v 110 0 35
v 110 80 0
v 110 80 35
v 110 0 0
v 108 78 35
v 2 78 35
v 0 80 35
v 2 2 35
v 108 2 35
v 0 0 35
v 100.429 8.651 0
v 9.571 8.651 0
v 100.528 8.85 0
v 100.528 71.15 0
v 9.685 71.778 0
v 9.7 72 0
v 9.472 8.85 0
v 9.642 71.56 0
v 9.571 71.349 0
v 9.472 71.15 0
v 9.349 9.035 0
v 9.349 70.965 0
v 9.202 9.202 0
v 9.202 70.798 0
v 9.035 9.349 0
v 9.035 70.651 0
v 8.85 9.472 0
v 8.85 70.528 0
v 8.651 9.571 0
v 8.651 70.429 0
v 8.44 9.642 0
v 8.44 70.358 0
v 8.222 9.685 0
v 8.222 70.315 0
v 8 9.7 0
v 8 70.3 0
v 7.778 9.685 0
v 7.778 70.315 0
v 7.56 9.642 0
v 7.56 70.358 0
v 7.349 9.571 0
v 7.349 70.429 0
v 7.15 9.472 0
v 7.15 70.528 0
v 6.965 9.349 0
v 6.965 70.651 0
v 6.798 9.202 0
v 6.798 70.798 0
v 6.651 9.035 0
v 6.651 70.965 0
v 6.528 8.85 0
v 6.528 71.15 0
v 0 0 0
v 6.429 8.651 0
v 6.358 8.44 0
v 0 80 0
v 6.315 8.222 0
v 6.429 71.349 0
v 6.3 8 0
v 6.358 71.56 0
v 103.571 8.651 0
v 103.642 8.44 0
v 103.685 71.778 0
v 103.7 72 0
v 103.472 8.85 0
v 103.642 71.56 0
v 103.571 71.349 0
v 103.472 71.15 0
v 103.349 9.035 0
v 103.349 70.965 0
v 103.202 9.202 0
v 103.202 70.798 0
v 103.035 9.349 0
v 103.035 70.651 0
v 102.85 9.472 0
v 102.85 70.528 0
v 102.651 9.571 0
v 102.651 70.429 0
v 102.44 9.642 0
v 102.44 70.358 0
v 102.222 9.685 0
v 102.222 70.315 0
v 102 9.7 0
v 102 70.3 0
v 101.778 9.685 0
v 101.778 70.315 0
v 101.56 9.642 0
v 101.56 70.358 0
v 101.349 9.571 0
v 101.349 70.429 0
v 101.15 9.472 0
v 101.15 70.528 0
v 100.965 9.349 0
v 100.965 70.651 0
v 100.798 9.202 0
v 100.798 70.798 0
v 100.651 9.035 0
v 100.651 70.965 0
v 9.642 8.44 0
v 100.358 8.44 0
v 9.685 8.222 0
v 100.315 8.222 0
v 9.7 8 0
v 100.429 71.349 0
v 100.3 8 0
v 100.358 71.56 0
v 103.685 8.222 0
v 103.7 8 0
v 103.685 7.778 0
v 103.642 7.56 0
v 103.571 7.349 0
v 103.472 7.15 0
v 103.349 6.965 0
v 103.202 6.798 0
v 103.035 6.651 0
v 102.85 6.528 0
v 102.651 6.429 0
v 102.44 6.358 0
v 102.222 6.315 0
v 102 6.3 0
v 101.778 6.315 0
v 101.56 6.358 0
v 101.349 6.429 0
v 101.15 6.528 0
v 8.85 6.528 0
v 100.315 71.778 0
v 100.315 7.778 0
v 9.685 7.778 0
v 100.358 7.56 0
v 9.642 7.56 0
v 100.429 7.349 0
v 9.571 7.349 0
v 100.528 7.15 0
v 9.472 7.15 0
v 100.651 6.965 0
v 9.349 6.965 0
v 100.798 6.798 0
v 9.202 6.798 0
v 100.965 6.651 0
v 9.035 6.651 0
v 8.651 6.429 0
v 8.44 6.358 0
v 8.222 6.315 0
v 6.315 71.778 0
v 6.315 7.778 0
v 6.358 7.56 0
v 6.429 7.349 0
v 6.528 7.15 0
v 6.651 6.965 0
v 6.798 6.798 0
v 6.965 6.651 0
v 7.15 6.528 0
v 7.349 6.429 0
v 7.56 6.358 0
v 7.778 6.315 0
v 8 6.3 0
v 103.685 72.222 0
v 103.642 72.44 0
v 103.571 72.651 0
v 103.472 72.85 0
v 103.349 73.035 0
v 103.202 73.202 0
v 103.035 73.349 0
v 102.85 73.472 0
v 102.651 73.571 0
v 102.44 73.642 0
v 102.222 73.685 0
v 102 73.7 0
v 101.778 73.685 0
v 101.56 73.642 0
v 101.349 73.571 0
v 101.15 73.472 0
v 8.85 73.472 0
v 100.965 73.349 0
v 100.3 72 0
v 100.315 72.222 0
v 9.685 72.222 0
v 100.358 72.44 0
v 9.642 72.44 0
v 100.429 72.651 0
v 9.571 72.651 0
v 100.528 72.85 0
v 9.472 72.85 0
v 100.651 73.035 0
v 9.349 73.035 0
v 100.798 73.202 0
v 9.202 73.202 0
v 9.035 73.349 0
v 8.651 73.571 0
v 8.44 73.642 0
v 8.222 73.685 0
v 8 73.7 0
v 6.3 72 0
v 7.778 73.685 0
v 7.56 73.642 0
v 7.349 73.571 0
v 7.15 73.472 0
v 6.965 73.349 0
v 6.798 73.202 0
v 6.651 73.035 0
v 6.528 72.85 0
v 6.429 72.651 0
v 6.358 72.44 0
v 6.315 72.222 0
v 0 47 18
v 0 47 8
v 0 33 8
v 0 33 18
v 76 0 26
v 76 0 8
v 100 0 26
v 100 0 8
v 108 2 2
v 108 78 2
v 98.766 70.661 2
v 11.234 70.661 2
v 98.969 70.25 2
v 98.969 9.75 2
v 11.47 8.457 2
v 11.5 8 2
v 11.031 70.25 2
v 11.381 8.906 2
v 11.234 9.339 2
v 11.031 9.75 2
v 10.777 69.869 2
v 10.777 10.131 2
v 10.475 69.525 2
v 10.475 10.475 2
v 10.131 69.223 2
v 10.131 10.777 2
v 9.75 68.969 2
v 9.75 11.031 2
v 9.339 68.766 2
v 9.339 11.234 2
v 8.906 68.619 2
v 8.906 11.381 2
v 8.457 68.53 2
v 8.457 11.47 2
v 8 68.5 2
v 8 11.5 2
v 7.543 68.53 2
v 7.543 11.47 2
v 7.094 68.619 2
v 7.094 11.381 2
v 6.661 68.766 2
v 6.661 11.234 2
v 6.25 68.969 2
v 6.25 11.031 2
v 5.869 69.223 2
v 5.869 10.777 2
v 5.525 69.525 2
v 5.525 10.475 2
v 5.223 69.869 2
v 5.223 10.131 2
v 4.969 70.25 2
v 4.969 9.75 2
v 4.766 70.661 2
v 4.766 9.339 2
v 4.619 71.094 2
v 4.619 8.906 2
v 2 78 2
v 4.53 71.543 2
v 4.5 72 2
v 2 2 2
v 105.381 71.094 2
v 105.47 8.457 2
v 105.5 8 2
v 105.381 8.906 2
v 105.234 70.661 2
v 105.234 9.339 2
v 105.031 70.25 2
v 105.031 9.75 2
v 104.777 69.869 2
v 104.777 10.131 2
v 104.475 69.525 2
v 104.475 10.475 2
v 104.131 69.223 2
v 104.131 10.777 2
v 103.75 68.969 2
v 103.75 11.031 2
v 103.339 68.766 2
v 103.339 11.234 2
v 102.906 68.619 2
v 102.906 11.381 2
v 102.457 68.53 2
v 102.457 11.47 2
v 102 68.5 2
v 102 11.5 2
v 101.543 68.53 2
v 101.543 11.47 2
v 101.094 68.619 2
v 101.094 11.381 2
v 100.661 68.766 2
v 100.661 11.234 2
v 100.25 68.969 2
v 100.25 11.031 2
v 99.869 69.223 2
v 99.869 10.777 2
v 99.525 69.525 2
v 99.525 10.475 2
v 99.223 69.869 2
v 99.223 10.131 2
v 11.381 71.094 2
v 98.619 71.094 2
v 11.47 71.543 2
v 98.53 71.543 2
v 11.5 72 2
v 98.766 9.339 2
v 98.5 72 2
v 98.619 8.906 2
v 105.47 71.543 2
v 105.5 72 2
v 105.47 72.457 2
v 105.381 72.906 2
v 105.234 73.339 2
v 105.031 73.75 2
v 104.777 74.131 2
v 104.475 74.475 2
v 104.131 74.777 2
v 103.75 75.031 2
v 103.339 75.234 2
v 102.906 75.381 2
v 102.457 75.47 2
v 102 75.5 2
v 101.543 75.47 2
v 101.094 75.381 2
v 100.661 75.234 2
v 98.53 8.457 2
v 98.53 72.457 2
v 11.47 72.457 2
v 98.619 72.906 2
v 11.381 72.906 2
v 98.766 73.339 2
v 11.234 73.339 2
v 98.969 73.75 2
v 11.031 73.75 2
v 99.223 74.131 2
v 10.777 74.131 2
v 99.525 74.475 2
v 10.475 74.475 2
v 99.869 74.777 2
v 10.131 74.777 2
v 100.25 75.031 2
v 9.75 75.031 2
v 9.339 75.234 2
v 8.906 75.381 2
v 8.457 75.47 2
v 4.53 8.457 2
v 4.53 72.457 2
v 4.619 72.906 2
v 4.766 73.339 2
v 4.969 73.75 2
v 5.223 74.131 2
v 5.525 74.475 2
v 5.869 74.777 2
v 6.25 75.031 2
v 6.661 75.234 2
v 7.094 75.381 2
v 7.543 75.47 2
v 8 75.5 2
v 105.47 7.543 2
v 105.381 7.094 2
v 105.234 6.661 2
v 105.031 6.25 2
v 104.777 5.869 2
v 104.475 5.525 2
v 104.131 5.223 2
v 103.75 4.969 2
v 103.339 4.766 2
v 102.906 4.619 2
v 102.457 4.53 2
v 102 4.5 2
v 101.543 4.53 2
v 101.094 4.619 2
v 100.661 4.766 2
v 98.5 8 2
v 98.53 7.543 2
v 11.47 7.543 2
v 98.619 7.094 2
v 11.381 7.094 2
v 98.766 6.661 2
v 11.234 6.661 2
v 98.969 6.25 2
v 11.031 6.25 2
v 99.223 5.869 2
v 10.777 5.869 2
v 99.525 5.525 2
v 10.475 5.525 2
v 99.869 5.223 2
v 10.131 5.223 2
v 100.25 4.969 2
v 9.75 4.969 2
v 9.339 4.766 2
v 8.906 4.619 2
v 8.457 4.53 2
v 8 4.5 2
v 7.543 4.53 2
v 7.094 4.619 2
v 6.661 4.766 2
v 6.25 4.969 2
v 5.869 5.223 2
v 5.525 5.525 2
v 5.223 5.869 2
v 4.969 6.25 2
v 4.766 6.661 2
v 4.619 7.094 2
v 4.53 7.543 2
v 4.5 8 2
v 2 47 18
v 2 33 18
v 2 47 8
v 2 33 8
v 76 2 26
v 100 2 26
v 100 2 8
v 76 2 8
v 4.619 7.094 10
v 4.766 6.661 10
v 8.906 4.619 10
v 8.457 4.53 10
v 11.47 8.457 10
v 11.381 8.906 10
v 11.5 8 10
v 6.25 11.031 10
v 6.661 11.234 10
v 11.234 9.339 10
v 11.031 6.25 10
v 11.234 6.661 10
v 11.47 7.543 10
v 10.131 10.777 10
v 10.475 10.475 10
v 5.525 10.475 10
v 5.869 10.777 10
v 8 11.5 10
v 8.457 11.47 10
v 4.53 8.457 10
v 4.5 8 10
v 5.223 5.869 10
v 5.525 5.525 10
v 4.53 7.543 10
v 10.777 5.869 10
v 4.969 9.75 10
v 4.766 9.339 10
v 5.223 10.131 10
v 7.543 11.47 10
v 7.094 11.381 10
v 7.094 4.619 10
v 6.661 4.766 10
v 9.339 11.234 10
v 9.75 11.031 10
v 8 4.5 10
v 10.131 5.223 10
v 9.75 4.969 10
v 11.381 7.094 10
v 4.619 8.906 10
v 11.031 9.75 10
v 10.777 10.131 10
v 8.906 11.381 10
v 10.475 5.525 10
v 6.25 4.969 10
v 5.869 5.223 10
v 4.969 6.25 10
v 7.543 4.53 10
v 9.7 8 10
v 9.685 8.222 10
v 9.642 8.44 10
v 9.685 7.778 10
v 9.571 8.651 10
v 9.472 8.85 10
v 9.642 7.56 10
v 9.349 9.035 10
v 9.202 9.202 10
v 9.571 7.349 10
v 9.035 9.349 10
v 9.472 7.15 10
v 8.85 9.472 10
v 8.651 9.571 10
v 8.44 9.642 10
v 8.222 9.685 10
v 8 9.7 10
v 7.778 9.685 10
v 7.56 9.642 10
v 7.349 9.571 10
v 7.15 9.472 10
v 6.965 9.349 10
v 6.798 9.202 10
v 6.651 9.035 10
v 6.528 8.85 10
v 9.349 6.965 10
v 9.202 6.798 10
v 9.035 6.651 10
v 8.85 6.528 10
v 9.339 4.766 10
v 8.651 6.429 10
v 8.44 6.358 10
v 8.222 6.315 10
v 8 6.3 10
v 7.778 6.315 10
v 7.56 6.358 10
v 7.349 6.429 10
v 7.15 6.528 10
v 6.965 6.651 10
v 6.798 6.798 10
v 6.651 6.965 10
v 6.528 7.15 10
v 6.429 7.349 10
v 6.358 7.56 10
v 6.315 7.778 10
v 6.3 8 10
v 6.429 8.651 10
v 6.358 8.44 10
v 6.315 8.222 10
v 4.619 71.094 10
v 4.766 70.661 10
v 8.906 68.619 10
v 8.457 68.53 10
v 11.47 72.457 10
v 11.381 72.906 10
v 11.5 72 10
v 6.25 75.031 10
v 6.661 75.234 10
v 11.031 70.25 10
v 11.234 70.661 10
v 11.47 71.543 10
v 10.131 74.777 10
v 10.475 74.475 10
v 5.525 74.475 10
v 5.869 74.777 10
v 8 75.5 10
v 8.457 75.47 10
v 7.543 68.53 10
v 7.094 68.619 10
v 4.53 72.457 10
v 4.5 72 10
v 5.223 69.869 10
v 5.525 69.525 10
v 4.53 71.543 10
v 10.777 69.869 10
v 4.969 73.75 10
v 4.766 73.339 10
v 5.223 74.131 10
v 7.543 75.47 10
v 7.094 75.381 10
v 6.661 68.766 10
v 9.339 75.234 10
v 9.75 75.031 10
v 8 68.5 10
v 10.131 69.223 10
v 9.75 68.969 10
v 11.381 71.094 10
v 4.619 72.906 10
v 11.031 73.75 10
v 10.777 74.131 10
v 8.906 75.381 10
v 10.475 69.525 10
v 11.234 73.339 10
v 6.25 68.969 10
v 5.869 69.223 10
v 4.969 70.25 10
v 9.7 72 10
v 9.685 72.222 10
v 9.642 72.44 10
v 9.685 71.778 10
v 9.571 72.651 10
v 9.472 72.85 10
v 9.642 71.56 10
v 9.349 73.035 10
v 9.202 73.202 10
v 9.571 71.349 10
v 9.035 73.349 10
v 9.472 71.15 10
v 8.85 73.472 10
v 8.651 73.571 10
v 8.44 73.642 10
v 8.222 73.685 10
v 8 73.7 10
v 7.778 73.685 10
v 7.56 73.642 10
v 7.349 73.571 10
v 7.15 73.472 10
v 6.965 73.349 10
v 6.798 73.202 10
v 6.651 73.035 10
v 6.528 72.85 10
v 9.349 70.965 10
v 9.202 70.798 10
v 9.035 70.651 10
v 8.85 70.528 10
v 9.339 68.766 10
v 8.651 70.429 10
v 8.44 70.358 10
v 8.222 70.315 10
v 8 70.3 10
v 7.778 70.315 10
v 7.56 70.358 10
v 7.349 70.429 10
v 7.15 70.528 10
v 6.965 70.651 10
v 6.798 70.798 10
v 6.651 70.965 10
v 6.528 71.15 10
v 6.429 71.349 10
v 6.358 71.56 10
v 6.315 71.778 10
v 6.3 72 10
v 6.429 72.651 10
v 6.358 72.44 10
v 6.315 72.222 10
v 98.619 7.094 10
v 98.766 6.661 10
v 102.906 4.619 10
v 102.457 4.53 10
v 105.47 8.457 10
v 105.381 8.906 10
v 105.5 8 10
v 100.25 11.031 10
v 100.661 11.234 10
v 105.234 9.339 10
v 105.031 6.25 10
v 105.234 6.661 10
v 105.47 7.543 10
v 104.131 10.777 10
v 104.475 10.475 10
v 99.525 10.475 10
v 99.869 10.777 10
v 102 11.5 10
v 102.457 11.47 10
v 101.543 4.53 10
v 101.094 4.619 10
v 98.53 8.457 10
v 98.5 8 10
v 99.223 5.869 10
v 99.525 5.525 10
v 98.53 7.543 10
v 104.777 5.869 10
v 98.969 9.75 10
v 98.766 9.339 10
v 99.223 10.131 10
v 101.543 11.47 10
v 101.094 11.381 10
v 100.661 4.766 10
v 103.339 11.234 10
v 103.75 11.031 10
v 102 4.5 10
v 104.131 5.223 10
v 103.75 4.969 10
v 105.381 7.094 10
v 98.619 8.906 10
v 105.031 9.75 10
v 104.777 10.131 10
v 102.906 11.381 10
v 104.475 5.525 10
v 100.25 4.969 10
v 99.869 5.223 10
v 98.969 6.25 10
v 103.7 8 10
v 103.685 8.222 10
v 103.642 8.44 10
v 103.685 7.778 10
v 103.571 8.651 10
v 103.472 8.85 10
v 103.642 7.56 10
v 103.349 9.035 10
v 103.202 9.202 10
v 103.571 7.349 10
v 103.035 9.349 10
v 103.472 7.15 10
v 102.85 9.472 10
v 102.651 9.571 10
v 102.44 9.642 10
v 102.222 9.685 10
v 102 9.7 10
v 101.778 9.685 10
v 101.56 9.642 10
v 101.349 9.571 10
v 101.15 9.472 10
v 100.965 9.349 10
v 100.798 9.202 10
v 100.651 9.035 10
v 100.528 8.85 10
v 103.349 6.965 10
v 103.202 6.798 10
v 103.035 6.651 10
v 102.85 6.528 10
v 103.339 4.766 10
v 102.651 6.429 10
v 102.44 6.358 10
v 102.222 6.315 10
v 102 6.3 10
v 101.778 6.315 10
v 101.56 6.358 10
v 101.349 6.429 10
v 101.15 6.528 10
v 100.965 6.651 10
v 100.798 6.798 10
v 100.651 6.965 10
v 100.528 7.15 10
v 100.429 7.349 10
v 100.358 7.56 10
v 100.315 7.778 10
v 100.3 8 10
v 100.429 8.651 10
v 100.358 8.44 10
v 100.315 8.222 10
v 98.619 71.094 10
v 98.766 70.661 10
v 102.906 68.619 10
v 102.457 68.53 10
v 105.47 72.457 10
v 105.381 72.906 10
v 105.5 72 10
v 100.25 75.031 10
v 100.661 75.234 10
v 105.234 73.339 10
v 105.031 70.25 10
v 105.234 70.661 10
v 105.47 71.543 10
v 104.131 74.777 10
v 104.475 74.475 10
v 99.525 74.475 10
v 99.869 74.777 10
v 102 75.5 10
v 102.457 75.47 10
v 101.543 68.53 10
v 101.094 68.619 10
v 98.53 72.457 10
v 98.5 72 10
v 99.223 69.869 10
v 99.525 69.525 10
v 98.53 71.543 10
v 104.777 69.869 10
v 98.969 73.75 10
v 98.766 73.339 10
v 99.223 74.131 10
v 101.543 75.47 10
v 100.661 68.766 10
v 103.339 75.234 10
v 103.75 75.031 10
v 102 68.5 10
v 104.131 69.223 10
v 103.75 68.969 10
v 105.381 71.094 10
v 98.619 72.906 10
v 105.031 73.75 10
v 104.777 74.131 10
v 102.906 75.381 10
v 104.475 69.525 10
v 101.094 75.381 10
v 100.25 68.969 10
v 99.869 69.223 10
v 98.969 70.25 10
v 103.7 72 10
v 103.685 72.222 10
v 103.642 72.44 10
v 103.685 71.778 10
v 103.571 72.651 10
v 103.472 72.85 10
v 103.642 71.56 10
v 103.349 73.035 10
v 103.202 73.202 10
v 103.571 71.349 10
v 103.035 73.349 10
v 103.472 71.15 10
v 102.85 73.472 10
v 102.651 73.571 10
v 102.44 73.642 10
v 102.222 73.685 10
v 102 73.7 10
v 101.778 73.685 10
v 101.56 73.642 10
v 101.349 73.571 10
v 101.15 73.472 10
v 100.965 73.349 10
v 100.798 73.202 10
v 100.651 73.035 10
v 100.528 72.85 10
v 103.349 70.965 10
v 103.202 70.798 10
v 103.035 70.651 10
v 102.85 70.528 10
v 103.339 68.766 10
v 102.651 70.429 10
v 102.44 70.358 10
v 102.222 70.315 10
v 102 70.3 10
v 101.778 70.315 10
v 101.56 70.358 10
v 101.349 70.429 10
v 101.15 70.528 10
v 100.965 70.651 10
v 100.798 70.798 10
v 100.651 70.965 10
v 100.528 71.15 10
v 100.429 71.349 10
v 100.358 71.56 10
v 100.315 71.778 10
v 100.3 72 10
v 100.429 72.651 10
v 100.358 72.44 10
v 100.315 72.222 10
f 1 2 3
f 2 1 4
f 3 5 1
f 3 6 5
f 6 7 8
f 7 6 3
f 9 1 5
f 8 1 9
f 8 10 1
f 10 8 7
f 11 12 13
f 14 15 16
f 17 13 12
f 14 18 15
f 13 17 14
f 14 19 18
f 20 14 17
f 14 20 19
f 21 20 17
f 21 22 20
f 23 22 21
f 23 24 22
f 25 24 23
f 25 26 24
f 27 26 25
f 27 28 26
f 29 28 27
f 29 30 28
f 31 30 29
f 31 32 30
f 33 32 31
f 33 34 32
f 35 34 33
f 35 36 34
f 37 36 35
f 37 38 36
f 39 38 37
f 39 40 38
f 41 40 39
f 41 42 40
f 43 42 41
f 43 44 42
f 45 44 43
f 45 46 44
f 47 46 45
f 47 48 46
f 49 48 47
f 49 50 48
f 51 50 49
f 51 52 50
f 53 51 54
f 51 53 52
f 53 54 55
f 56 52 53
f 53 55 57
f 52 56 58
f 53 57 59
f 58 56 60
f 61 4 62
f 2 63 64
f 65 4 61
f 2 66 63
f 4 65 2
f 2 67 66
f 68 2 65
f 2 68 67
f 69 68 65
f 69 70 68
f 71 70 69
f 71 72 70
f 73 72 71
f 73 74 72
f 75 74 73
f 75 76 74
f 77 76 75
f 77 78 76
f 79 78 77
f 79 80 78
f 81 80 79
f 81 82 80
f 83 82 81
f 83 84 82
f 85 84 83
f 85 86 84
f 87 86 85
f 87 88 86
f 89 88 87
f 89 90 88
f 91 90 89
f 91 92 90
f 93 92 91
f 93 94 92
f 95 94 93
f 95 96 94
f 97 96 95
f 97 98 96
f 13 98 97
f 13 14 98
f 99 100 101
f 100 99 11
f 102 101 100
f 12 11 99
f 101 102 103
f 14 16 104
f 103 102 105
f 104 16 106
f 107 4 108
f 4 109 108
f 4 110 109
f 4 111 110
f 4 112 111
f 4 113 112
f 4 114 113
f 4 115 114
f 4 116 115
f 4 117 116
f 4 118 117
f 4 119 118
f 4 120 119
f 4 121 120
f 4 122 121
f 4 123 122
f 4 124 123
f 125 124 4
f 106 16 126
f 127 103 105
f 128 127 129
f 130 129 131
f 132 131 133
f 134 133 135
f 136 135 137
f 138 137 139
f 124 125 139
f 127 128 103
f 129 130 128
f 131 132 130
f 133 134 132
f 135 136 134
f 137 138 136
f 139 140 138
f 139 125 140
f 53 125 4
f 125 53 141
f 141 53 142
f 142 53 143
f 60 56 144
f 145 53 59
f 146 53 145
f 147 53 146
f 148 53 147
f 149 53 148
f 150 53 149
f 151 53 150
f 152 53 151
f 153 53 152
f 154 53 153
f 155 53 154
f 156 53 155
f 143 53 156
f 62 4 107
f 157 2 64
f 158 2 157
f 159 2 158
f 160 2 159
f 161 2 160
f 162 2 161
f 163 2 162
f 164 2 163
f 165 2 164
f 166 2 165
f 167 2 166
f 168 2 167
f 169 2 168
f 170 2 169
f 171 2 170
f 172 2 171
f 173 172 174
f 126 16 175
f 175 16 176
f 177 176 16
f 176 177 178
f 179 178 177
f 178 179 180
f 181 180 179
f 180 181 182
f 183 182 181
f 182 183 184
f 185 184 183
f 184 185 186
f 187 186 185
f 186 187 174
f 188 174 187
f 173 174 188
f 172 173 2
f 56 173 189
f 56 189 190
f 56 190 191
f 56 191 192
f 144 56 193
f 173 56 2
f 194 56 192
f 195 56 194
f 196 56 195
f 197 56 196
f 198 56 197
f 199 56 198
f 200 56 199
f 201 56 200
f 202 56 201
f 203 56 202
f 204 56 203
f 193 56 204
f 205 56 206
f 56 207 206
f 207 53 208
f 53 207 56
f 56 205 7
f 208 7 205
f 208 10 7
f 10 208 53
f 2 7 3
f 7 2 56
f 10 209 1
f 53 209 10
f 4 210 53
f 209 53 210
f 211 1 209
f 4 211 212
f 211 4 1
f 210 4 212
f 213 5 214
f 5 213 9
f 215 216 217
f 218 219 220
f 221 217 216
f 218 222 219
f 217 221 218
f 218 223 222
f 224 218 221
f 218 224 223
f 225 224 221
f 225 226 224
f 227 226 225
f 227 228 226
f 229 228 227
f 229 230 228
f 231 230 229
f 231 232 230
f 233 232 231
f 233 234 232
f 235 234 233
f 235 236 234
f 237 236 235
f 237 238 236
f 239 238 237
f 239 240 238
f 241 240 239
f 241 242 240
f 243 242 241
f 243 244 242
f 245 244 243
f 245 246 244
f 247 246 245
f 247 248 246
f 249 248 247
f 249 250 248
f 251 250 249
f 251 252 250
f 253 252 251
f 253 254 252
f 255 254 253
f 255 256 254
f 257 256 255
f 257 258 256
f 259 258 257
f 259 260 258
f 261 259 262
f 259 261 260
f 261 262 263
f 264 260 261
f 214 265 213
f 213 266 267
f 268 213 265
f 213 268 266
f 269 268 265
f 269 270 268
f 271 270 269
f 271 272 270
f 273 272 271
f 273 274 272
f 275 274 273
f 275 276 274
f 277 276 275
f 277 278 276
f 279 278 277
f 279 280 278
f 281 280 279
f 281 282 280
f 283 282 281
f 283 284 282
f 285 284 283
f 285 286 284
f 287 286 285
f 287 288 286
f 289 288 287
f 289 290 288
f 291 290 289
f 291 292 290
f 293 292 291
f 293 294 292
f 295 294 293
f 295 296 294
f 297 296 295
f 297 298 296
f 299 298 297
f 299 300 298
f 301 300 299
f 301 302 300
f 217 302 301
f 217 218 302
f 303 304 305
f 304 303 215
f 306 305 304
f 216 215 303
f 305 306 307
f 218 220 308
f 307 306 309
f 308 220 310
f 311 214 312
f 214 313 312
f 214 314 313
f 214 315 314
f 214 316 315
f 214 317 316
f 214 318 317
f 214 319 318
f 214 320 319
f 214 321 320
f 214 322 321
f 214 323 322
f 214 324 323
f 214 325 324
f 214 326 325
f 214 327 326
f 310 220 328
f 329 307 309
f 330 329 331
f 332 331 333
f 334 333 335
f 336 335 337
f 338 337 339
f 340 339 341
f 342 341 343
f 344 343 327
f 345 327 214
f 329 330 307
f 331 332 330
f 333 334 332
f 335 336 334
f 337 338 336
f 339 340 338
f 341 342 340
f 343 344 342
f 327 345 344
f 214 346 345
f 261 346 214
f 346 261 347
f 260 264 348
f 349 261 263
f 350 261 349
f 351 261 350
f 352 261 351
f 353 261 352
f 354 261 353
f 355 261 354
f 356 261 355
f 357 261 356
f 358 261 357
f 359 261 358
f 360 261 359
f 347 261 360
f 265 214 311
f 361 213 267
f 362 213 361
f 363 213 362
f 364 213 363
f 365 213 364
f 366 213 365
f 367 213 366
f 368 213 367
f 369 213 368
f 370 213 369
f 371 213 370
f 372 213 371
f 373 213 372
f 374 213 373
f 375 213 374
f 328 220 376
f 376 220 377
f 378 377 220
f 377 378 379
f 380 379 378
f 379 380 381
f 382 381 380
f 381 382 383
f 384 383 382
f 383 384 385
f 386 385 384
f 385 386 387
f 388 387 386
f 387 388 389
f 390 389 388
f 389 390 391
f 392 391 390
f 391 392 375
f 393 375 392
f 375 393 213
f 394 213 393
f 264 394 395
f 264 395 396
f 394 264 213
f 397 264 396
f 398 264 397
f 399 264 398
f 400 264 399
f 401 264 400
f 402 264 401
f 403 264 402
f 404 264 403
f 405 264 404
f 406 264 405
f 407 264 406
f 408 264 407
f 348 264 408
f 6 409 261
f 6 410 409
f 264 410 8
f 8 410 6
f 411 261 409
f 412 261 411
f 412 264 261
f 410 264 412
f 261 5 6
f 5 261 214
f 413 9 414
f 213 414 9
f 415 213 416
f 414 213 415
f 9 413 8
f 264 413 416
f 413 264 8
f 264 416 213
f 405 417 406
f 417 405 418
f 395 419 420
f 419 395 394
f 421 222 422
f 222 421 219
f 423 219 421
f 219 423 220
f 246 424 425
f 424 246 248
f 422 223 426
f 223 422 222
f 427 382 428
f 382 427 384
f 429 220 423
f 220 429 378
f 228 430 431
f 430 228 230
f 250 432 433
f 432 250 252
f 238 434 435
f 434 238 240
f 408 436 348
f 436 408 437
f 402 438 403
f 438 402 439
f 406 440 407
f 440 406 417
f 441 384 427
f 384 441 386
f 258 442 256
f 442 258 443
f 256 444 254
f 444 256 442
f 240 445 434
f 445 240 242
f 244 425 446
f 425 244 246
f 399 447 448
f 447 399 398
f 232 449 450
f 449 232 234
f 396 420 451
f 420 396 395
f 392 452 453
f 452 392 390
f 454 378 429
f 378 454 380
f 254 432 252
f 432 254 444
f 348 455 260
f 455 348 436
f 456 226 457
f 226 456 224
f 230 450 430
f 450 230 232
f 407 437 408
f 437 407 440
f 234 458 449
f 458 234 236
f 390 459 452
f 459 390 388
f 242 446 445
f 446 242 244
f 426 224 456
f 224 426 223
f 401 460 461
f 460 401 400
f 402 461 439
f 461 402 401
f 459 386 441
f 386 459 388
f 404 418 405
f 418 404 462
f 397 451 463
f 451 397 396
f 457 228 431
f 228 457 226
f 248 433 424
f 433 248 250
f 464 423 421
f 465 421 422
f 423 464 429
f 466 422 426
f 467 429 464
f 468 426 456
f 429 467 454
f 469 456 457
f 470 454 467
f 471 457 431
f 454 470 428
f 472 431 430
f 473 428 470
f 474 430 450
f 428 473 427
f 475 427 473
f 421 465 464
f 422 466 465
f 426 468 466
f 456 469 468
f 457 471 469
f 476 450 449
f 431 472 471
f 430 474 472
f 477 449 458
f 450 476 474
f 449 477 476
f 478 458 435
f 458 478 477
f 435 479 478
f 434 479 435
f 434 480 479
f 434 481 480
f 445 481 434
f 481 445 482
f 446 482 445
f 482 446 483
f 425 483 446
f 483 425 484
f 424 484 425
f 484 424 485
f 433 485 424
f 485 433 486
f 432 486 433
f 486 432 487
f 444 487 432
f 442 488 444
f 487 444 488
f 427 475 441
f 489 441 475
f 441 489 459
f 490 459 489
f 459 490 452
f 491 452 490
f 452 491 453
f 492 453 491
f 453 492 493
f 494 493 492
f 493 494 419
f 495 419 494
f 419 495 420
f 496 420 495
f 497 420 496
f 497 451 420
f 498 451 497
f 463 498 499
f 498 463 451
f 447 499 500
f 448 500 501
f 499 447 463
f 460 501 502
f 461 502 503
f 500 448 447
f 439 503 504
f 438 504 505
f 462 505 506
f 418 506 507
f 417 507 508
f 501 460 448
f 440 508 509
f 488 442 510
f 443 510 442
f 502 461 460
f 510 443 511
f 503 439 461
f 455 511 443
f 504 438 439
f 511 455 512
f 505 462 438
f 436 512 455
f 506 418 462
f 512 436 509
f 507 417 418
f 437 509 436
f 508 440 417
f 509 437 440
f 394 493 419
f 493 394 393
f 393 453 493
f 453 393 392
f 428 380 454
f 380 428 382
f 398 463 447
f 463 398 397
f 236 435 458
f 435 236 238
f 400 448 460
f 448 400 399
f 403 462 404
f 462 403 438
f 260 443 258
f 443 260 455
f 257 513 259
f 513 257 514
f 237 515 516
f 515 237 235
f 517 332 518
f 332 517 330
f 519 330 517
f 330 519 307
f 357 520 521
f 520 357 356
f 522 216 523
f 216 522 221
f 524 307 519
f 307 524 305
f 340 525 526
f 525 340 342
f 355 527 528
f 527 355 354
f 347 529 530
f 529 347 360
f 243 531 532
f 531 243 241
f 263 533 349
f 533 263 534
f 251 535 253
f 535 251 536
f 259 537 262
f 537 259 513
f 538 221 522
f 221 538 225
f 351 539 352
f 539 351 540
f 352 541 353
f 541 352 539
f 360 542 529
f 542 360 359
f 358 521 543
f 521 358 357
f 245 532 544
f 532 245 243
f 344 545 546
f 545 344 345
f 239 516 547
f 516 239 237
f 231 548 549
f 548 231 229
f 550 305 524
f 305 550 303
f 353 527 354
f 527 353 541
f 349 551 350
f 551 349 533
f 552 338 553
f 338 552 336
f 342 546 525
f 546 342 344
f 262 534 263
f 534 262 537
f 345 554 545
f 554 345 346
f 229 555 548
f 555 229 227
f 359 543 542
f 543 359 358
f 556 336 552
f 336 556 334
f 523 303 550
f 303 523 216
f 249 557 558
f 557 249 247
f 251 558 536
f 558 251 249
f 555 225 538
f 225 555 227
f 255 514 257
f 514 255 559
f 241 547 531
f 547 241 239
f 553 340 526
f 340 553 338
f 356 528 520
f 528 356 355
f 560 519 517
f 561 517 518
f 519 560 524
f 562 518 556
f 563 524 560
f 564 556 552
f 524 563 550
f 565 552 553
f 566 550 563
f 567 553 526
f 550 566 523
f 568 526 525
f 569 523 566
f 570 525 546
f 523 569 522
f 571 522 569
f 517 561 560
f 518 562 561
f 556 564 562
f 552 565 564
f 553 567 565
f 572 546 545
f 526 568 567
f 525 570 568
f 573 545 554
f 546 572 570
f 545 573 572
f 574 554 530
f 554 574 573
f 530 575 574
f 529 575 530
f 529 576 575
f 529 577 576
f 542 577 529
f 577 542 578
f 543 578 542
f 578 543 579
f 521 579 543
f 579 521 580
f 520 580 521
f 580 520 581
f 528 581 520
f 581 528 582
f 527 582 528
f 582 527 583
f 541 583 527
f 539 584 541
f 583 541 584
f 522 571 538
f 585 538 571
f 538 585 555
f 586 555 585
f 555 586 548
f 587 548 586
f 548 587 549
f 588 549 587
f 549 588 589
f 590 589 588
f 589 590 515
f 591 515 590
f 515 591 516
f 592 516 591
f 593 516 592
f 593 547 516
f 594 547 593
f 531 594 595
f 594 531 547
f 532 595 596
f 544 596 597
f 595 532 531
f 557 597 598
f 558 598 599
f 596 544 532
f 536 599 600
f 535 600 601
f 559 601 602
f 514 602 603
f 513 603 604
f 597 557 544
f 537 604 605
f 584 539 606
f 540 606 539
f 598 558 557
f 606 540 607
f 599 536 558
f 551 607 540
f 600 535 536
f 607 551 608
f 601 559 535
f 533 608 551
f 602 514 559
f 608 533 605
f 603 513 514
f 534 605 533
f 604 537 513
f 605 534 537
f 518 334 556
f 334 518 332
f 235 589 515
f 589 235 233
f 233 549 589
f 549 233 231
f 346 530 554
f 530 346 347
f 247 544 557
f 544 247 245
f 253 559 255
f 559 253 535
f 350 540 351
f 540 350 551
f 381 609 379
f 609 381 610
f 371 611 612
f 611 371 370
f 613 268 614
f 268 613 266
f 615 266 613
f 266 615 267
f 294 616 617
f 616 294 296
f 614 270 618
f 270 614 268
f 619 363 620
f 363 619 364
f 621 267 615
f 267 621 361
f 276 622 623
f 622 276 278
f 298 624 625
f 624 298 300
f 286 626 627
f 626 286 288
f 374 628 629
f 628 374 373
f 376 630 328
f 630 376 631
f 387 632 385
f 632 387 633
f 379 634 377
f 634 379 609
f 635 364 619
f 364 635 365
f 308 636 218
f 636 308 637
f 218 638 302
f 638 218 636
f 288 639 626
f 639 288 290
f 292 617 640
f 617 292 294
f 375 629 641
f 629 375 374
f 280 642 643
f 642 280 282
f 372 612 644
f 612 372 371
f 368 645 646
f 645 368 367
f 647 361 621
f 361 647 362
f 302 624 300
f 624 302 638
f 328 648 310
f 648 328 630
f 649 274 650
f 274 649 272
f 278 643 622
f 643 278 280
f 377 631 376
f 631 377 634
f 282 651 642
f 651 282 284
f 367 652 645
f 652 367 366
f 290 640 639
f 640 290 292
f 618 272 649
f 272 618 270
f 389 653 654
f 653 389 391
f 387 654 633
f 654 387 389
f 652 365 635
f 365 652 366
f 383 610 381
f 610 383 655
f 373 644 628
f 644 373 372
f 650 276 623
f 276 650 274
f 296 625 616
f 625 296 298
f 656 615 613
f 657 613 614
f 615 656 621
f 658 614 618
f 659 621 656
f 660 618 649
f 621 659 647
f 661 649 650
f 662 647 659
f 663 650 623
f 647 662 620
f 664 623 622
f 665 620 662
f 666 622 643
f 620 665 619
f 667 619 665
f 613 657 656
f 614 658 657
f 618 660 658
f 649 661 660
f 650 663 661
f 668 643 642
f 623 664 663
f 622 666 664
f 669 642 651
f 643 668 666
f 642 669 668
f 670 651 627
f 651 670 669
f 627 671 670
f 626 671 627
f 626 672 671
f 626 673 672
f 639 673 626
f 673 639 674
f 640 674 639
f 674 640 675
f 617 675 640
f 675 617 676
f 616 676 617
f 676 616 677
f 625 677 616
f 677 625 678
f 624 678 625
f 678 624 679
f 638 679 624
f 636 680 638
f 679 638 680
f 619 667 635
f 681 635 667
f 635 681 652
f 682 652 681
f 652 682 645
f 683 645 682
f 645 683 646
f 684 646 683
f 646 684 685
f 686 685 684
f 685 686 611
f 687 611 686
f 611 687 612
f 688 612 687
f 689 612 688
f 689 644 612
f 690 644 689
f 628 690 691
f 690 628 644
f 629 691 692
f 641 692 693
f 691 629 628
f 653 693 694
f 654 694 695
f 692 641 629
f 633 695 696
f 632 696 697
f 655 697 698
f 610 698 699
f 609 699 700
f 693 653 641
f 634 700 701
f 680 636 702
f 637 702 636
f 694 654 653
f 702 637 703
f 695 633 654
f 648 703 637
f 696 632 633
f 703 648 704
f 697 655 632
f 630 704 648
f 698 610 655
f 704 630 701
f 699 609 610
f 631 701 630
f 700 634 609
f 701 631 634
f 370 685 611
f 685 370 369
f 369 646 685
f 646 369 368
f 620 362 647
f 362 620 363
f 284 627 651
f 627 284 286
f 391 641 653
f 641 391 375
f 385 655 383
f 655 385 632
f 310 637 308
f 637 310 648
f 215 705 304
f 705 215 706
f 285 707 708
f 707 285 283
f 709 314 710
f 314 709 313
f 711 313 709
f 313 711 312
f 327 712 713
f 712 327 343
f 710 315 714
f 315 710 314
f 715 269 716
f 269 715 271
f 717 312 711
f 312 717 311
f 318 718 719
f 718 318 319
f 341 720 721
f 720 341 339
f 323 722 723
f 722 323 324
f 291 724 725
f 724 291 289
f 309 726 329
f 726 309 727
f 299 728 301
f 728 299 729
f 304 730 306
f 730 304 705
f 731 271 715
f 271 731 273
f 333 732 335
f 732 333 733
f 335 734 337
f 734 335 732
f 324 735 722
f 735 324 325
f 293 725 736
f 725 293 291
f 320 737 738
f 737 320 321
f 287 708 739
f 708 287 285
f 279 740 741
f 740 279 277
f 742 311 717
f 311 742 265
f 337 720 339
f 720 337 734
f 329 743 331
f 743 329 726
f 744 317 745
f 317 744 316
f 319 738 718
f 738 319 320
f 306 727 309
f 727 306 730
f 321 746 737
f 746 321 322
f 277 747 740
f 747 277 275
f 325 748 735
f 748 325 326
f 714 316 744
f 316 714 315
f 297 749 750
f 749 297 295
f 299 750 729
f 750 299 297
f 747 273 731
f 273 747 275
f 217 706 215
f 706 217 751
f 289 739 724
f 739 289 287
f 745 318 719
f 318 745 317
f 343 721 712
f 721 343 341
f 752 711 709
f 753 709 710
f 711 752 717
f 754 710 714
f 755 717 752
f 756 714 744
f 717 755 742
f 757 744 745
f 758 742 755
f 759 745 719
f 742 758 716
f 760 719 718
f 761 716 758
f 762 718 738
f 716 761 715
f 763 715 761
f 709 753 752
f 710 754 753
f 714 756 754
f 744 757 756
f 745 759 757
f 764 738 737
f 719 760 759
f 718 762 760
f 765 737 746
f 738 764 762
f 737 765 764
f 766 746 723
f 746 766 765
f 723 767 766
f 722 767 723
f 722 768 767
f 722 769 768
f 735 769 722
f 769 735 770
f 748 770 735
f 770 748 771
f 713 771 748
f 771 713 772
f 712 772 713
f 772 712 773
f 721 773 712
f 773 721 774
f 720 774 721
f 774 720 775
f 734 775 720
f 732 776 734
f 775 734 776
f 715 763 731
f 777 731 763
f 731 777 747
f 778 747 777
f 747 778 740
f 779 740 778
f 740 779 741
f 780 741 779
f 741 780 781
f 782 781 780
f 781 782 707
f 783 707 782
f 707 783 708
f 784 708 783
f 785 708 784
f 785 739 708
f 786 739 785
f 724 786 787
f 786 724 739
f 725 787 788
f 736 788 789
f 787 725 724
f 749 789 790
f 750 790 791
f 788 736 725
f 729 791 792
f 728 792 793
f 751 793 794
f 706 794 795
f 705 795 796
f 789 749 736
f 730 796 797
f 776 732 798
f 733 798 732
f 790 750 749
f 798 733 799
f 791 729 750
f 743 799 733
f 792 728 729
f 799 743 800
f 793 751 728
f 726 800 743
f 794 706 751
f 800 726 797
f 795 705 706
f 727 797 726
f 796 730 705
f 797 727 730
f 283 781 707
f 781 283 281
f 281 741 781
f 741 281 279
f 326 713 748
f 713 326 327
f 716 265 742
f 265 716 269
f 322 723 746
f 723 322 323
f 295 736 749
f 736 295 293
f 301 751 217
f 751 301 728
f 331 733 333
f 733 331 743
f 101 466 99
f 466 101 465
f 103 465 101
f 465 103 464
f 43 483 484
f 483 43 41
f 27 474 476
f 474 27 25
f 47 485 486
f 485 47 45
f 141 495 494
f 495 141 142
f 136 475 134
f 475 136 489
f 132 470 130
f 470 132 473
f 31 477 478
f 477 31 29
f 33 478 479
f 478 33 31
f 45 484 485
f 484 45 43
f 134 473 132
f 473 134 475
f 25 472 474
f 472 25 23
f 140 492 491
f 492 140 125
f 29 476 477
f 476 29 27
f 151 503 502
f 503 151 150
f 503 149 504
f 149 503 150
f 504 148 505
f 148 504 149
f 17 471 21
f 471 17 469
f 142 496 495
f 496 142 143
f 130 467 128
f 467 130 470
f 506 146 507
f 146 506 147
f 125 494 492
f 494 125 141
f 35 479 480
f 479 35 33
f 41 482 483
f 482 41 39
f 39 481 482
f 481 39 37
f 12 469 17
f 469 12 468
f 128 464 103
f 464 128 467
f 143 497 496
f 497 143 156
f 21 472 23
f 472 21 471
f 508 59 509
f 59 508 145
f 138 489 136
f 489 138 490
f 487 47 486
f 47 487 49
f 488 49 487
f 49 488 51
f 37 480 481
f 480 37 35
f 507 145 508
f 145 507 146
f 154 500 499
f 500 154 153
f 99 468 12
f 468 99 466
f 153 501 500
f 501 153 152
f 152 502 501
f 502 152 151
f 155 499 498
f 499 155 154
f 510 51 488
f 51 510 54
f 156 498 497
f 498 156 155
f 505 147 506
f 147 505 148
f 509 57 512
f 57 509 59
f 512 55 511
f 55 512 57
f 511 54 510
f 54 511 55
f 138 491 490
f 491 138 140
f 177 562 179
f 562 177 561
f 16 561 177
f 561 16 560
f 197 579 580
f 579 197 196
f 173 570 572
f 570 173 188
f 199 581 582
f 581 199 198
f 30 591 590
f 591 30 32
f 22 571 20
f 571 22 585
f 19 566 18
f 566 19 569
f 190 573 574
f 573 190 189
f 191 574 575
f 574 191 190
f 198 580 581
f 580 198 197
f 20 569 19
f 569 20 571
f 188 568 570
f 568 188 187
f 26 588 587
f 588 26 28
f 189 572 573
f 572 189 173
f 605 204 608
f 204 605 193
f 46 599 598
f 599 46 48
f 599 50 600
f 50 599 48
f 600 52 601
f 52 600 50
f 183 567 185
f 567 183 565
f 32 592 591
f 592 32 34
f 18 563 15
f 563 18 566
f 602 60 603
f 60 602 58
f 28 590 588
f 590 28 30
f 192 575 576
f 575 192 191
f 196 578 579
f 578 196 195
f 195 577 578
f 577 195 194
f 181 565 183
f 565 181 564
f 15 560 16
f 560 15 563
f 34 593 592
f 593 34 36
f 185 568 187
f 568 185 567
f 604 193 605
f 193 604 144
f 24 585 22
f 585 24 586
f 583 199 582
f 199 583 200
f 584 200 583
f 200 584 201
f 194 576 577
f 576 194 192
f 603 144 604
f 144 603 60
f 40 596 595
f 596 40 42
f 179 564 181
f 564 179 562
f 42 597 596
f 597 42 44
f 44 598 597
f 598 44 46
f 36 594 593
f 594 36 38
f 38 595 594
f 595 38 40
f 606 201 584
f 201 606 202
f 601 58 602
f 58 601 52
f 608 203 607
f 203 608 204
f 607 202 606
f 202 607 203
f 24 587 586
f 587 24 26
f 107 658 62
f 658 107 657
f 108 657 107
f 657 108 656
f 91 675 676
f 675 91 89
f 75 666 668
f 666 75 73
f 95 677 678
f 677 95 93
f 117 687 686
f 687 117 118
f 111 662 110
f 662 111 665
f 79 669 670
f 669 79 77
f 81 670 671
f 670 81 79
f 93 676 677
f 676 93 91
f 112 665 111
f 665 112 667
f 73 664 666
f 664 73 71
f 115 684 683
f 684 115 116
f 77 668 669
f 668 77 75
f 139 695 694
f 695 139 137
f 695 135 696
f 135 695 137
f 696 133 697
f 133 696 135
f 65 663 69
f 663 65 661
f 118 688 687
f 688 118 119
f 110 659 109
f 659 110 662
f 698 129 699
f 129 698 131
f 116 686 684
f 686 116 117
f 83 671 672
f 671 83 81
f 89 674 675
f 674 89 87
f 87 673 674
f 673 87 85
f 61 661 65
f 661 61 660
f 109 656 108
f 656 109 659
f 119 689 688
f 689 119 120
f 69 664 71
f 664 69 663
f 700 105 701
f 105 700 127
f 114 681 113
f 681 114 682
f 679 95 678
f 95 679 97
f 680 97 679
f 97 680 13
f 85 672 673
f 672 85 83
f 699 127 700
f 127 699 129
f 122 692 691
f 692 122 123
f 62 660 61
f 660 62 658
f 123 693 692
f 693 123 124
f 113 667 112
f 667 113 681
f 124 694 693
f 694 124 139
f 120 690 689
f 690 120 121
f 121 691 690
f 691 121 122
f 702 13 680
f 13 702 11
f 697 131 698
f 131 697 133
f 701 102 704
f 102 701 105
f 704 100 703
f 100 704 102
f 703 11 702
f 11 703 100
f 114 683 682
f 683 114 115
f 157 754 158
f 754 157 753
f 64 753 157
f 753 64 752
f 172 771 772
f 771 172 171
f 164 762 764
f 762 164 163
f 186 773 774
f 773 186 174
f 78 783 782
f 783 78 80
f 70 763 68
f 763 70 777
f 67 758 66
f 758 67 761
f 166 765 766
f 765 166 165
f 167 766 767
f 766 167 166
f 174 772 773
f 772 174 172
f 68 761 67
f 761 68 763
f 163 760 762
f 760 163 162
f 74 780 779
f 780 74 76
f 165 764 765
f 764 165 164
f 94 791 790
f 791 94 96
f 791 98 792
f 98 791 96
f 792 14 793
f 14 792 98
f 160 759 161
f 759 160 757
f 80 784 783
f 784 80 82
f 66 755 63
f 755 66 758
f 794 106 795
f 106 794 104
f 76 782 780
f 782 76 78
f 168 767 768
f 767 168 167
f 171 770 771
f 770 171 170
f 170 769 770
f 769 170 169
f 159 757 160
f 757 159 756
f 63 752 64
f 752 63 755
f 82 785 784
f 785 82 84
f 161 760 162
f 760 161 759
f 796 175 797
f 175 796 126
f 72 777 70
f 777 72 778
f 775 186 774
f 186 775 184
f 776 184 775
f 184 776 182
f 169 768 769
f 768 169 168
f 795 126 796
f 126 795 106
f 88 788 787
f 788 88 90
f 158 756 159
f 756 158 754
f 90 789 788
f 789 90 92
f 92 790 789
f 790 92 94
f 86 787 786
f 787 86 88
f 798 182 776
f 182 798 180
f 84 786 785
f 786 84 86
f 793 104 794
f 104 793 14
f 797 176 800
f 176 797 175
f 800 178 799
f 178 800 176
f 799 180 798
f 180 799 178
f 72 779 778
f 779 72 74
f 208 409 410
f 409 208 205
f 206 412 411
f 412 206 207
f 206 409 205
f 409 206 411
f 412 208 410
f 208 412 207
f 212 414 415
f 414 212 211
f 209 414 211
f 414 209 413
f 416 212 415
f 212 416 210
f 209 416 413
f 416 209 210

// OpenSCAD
// Dimensi latihan dalam mm; ukur komponen sebelum membuat enclosure akhir.
part = "base"; // "base", "lid", atau "assembly"
L = 110;
W = 80;
H = 35;
wall = 2;
floor_t = 2;
lid_t = 2;
gap = 0.4; // clearance per sisi
lip_t = 1.6;
lip_h = 3;
screw_d = 3.4;
boss_d = 7;
boss_h = 8;
inset = 8;
$fn = 48;

assert(L > 2*wall+2*gap+2*lip_t && W > 2*wall+2*gap+2*lip_t);
assert(H > floor_t+boss_h+lip_h && gap > 0 && wall > 0);
assert(screw_d < boss_d && inset > wall+gap+lip_t+boss_d/2);
assert(part == "base" || part == "lid" || part == "assembly", "part tidak dikenal");

module screw_positions() {
  for (x = [inset, L-inset], y = [inset, W-inset])
    translate([x,y,0]) children();
}

module base() {
  difference() {
    union() {
      difference() {
        cube([L,W,H]);
        translate([wall,wall,floor_t])
          cube([L-2*wall,W-2*wall,H]);
      }
      screw_positions() translate([0,0,floor_t]) cylinder(d=boss_d,h=boss_h);
    }
    screw_positions() translate([0,0,-0.1]) cylinder(d=screw_d,h=H+0.2);
    // Bukaan USB contoh; posisinya harus dicocokkan dengan board dan kabel.
    translate([-0.1,W/2-7,8]) cube([wall+0.2,14,10]);
    // Bukaan sensor pada dinding depan.
    translate([L-34,-0.1,8]) cube([24,wall+0.2,18]);
  }
}

module lid() {
  difference() {
    union() {
      cube([L,W,lid_t]);
      translate([wall+gap,wall+gap,lid_t]) difference() {
        cube([L-2*(wall+gap),W-2*(wall+gap),lip_h]);
        translate([lip_t,lip_t,-0.1])
          cube([L-2*(wall+gap+lip_t),W-2*(wall+gap+lip_t),lip_h+0.2]);
      }
    }
    screw_positions() translate([0,0,-0.1]) cylinder(d=screw_d,h=lid_t+lip_h+0.2);
    for (y = [20:6:44]) translate([65,y,-0.1]) cube([28,2,lid_t+0.2]);
    translate([97,62,-0.1]) cylinder(d=5.4,h=lid_t+0.2);
  }
}

if (part == "base") base();
if (part == "lid") lid();
if (part == "assembly") {
  base();
  translate([0,W,H+lid_t]) rotate([180,0,0]) lid();
}
